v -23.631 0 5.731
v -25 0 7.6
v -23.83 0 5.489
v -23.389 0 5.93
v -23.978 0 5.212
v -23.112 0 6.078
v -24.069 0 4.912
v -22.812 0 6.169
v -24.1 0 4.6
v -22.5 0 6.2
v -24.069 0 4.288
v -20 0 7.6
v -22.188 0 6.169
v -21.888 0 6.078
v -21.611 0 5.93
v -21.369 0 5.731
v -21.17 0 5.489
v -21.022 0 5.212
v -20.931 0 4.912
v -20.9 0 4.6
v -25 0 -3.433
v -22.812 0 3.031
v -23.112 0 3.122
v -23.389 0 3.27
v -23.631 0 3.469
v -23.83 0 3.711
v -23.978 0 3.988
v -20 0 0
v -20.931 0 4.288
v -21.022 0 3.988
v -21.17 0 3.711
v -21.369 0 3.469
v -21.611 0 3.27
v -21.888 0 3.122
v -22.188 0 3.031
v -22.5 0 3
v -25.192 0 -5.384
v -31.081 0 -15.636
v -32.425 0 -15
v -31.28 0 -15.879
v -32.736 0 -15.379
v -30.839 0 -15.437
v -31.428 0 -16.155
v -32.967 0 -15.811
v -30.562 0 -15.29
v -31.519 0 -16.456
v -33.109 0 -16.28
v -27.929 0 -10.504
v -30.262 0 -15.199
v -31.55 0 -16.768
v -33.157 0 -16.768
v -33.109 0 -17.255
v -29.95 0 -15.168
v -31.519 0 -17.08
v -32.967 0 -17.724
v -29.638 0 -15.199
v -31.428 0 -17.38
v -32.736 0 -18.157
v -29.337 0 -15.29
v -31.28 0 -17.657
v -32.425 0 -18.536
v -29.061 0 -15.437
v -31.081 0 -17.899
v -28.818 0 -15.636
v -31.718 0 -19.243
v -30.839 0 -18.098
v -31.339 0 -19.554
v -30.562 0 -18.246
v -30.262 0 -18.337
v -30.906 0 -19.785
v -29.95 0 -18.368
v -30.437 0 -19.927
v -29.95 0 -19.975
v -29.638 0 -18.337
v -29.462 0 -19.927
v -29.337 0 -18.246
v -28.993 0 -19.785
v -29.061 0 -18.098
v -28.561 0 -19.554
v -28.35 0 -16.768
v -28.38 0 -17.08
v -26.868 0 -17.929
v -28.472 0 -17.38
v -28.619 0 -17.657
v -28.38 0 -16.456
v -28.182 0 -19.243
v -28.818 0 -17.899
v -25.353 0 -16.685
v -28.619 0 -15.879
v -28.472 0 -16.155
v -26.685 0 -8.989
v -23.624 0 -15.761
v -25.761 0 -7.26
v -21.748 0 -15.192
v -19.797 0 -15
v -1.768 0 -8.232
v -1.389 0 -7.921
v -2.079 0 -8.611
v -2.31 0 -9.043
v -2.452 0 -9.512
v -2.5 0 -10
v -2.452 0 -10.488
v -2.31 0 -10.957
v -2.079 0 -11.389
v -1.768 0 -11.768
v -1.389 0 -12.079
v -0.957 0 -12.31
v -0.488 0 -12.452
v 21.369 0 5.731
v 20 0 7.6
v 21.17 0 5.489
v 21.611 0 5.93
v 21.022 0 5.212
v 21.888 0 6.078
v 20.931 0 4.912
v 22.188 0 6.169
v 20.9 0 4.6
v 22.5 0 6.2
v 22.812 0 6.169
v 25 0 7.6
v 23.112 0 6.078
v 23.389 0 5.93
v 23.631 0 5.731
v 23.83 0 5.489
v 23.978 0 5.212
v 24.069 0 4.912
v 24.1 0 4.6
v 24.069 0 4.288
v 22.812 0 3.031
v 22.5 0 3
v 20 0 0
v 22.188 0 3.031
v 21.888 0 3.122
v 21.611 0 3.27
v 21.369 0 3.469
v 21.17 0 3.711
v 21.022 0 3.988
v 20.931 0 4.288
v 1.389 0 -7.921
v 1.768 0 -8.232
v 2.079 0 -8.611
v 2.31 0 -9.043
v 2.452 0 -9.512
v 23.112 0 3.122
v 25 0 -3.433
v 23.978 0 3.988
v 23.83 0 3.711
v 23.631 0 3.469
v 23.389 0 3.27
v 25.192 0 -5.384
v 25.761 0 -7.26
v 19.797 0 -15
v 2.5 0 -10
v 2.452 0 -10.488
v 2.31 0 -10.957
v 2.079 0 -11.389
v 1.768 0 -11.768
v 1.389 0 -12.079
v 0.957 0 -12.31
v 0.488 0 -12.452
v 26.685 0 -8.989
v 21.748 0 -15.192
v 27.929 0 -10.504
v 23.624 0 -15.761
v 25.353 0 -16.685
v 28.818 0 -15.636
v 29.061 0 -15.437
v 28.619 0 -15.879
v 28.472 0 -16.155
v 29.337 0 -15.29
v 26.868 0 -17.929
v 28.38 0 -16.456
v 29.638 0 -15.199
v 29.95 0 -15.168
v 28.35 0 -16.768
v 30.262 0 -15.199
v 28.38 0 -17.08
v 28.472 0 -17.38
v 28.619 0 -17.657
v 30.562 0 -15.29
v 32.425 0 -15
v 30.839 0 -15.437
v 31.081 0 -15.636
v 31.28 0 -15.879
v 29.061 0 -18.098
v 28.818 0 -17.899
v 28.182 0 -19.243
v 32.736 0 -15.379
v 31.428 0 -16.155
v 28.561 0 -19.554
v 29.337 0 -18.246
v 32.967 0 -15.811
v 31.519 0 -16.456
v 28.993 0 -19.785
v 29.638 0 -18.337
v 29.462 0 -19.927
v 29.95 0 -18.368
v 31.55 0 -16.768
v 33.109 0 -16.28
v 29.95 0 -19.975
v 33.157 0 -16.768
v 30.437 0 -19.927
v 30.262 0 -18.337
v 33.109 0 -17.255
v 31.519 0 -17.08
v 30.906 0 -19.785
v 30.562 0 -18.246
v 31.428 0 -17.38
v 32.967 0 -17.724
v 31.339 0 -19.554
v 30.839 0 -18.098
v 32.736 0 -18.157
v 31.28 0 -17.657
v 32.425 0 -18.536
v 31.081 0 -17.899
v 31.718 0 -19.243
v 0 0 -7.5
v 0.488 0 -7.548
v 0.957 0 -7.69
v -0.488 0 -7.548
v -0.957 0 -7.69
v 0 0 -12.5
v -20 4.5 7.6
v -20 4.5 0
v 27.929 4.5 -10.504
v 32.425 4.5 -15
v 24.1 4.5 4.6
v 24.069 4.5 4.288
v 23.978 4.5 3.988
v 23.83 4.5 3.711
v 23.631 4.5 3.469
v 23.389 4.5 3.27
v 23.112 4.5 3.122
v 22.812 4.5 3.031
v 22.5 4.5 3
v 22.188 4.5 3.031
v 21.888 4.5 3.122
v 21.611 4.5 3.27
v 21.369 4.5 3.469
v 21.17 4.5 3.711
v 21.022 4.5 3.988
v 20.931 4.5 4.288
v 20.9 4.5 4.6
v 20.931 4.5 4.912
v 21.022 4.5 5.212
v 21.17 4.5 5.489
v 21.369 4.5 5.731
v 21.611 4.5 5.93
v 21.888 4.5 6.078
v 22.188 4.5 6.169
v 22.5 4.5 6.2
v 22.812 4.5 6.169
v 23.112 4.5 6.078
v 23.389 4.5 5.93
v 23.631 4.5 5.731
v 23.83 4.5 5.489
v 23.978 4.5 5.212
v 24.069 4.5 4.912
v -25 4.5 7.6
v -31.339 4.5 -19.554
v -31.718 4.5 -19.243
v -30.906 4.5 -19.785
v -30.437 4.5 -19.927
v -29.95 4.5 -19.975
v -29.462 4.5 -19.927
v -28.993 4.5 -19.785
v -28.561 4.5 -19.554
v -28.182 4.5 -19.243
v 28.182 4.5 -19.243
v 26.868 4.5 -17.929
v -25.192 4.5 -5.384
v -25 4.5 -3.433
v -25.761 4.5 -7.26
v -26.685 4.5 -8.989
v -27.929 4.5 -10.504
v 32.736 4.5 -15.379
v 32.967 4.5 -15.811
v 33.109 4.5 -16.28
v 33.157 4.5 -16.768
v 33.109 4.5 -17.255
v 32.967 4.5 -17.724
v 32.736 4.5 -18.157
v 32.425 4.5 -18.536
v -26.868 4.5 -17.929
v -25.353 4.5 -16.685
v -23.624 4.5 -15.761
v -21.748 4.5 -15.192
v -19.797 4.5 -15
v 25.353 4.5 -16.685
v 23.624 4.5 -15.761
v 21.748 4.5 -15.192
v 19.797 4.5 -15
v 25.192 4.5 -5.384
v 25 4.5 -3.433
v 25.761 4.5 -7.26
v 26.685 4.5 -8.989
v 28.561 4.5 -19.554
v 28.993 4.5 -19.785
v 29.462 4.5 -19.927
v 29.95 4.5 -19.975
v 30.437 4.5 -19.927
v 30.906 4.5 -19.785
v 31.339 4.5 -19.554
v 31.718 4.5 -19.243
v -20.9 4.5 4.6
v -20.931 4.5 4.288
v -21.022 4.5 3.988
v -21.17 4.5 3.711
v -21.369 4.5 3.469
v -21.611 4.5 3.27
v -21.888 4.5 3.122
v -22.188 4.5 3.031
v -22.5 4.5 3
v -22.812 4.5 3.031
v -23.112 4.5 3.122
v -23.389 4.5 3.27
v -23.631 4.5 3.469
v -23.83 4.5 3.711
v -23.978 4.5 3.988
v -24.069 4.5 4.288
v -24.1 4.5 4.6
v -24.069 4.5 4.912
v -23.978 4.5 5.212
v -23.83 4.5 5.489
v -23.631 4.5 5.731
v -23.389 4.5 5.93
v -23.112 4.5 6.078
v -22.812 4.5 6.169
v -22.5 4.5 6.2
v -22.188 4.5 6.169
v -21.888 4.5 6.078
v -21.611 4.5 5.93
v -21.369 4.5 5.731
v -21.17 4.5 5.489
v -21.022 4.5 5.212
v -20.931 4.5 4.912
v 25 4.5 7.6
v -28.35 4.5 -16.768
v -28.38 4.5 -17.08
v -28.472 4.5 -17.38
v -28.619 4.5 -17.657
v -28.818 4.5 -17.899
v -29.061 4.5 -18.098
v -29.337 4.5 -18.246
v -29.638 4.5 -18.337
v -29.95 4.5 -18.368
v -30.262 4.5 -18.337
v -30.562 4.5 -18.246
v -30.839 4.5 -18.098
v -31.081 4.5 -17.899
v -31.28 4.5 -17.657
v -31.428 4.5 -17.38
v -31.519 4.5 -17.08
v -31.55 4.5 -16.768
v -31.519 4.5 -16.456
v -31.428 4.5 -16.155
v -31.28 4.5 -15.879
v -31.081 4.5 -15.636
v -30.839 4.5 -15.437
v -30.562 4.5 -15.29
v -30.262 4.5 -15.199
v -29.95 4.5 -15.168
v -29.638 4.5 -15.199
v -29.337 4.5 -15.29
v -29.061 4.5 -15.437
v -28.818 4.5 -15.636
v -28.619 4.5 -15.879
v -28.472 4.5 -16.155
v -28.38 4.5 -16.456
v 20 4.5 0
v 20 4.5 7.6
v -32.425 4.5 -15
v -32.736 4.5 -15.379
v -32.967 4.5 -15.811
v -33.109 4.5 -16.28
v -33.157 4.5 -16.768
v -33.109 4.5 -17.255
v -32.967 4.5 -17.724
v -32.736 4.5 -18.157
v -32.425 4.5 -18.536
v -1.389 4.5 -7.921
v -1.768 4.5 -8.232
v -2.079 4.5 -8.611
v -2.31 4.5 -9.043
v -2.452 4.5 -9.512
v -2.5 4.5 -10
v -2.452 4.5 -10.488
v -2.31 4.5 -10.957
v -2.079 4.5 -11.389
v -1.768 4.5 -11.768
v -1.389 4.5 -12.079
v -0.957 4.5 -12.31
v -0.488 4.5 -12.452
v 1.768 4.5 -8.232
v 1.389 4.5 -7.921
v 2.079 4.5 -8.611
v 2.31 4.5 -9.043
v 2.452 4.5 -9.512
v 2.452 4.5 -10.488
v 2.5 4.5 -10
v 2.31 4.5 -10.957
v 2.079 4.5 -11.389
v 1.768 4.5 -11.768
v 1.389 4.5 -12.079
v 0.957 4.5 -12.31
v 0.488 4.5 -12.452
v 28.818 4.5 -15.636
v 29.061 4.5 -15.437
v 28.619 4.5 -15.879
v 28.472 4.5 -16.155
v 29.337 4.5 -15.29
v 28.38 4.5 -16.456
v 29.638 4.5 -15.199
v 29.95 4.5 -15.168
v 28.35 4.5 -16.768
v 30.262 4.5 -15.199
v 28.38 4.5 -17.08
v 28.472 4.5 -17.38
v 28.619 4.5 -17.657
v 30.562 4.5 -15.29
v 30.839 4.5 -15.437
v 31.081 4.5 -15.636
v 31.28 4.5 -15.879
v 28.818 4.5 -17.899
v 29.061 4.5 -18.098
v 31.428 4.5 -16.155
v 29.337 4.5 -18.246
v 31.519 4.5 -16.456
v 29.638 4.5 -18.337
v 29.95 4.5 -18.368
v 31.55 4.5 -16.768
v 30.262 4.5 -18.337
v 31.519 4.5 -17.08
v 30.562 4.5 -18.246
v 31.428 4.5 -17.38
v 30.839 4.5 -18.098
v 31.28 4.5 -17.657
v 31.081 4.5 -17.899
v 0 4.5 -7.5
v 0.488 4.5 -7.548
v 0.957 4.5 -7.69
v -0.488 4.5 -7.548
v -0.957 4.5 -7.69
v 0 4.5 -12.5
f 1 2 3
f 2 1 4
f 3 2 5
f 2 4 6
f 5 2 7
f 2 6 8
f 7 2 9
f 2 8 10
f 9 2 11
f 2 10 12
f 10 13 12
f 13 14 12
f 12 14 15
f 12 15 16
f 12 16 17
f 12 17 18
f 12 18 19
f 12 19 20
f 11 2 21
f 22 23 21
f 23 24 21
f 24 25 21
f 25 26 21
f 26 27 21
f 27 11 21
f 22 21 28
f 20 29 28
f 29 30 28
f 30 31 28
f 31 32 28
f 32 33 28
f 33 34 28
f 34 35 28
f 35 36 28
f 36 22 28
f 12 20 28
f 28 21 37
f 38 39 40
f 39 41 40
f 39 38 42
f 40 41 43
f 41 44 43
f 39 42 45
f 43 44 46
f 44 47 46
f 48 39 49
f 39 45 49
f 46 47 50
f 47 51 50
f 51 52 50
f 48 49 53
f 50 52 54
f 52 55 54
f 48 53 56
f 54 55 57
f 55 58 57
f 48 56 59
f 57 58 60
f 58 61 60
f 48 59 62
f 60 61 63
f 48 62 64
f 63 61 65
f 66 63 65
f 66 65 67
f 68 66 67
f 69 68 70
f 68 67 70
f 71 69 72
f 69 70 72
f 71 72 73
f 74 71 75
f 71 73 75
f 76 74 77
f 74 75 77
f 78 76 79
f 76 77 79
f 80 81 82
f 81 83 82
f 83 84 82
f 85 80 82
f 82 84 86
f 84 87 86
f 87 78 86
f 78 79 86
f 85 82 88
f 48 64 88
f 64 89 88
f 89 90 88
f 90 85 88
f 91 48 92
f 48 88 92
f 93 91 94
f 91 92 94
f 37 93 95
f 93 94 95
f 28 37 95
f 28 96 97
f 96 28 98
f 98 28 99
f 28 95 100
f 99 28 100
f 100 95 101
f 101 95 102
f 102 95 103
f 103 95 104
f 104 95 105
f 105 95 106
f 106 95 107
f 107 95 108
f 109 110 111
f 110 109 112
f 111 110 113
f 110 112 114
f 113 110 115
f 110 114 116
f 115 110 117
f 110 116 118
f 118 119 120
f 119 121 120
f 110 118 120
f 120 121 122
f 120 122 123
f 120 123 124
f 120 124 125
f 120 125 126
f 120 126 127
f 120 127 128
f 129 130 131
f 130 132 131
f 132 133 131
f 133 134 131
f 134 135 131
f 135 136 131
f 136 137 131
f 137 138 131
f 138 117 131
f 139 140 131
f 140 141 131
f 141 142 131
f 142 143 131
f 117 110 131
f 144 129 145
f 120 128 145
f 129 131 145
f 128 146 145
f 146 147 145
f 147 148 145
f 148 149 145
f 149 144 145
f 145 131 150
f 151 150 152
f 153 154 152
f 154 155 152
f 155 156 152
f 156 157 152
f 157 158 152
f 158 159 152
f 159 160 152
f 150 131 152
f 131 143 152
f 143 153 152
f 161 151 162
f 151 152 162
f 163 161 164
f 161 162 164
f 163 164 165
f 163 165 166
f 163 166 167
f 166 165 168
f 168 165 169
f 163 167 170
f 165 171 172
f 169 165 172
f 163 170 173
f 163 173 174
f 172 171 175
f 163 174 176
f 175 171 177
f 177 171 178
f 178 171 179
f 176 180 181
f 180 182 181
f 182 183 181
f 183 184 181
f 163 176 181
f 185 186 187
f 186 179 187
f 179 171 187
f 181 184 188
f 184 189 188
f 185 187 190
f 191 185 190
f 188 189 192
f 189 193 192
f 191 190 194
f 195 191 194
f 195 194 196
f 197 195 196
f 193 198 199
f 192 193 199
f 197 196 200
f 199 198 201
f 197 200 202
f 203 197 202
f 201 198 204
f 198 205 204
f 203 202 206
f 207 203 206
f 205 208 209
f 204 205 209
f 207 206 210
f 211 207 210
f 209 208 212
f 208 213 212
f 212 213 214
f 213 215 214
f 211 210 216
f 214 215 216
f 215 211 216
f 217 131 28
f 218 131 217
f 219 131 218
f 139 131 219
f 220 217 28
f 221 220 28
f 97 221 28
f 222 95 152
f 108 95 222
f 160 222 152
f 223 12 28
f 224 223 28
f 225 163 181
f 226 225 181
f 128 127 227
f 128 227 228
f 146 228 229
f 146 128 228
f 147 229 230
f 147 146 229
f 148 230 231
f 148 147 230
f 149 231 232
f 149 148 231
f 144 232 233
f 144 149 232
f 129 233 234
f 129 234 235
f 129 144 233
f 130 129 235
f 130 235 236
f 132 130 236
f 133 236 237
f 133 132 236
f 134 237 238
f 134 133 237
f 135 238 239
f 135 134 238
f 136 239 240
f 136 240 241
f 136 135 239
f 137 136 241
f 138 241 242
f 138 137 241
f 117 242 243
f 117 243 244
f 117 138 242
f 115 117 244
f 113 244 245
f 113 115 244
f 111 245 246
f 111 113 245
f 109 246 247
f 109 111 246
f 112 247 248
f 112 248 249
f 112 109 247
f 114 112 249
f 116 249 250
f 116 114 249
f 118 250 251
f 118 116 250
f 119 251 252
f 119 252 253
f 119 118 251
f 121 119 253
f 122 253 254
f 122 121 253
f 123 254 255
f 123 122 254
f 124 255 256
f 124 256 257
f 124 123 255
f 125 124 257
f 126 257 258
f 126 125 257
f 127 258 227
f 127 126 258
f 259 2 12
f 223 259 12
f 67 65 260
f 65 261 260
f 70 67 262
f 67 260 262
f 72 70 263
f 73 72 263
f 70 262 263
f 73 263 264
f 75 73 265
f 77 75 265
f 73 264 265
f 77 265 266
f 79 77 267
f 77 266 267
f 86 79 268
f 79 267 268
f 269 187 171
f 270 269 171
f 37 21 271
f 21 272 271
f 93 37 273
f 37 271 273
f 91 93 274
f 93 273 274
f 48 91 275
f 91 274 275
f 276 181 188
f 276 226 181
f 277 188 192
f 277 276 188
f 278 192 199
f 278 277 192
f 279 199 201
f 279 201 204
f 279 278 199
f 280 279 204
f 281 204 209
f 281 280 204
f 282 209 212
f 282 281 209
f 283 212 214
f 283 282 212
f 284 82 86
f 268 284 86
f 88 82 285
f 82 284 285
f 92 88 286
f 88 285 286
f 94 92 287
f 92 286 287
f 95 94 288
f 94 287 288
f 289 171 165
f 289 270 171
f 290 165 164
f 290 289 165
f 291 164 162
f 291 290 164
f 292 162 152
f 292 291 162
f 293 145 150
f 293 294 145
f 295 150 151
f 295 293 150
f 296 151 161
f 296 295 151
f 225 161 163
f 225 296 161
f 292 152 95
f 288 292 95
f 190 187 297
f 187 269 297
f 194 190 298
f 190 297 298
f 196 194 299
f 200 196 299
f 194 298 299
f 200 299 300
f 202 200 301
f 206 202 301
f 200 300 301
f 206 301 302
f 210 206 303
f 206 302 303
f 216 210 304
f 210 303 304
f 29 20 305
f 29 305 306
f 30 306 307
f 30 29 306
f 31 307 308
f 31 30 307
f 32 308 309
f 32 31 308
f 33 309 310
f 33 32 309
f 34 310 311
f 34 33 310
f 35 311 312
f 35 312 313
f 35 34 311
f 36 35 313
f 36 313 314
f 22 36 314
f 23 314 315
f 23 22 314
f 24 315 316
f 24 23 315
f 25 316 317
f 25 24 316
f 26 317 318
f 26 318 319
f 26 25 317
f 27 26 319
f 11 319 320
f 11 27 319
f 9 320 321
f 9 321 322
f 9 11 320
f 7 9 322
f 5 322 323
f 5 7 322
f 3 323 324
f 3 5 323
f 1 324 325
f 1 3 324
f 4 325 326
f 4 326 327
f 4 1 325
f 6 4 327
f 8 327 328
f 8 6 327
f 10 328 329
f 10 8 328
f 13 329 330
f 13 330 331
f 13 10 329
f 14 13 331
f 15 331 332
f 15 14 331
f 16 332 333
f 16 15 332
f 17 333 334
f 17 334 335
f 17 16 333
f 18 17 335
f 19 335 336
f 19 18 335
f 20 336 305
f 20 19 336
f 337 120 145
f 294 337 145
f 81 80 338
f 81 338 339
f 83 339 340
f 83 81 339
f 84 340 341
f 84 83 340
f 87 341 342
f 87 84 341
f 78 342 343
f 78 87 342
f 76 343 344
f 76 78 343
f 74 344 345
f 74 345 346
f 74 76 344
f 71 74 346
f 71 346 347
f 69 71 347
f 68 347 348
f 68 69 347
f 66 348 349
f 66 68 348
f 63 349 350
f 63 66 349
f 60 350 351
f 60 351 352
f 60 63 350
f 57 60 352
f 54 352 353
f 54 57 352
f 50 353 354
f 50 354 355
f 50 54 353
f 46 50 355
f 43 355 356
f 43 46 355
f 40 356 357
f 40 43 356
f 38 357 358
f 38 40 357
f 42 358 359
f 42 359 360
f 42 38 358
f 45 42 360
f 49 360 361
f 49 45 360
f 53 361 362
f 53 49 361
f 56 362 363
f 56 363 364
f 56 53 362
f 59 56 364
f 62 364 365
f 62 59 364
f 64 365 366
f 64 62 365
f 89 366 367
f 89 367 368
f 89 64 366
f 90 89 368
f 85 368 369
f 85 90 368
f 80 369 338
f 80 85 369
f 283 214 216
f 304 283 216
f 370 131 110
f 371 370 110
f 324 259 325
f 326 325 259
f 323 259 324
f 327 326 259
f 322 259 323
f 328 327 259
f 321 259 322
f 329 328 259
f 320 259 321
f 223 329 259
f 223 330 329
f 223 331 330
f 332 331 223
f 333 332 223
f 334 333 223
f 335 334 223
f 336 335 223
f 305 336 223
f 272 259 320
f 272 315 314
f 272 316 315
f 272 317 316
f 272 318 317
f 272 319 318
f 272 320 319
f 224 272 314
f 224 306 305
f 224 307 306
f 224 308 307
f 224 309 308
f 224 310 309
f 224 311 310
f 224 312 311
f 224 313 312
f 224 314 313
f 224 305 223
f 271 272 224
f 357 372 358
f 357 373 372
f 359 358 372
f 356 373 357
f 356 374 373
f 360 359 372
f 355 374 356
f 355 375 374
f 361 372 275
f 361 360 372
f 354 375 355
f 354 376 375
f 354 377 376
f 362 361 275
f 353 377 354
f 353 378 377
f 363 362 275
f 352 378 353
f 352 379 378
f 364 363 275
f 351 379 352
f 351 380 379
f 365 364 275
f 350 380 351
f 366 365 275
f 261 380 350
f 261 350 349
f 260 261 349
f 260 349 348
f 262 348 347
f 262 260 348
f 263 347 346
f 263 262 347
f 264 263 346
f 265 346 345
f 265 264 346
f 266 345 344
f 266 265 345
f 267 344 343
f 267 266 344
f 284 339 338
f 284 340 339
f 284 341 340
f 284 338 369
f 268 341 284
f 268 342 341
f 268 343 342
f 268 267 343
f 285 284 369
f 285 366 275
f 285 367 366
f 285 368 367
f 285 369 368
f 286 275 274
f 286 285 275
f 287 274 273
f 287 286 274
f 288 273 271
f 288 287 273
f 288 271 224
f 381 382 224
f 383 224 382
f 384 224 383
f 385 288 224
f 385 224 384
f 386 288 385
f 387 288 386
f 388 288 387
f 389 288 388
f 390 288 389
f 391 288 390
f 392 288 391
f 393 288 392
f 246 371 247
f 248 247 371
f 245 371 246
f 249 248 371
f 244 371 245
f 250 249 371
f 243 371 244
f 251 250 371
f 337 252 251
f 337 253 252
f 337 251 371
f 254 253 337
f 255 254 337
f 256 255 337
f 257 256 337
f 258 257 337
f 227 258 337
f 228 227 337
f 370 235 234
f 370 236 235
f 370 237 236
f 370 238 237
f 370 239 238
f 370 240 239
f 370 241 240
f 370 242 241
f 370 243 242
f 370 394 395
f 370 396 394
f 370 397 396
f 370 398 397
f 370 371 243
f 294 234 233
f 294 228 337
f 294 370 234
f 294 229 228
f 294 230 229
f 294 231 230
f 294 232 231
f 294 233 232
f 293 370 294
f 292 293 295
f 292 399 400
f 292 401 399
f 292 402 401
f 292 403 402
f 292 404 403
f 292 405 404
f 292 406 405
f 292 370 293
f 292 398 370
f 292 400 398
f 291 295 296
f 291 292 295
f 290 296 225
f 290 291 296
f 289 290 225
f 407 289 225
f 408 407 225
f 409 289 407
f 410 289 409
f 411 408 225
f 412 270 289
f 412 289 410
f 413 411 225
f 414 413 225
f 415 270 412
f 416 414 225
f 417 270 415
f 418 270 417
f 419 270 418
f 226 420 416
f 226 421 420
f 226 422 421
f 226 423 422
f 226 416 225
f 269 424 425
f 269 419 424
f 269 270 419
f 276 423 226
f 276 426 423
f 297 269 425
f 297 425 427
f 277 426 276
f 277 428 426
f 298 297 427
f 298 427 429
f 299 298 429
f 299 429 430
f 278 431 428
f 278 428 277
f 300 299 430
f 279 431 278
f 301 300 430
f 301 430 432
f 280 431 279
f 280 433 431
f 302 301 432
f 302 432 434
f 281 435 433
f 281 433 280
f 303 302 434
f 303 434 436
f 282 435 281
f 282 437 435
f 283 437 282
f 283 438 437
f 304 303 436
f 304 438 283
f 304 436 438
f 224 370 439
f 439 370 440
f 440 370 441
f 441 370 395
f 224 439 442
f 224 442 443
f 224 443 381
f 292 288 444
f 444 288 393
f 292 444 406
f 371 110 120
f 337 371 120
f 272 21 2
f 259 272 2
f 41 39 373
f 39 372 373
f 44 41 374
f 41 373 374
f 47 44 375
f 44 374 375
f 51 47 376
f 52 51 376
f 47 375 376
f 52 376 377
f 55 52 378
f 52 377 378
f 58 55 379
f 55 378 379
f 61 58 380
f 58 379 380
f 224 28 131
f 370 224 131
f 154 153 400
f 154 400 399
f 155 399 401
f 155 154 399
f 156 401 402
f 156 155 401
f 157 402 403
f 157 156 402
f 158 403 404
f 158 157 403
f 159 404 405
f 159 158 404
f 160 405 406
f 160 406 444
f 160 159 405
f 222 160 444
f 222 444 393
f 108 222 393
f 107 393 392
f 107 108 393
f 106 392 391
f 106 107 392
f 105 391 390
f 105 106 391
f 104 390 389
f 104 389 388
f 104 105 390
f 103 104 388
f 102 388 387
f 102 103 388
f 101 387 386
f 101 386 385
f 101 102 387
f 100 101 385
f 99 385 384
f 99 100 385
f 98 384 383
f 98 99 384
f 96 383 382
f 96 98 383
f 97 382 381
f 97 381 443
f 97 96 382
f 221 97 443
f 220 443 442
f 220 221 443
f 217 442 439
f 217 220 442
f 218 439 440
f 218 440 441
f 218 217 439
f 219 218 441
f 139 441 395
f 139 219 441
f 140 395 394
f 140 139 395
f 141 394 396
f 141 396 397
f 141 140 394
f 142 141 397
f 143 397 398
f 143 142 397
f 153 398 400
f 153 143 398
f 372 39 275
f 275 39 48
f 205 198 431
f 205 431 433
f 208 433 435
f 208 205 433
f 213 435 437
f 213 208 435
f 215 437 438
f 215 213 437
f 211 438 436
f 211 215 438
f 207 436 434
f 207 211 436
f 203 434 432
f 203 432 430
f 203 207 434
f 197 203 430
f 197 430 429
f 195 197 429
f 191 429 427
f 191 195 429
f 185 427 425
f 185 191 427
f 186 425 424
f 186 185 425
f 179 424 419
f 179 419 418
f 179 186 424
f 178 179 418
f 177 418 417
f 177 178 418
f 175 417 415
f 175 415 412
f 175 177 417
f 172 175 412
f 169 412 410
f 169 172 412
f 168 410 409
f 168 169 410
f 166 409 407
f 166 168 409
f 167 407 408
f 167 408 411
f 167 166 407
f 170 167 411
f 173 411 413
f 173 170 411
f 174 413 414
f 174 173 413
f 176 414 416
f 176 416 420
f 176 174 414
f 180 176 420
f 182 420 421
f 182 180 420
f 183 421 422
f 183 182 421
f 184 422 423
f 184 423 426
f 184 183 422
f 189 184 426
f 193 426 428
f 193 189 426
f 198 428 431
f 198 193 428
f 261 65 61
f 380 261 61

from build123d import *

# Parameters (mm, degrees)
SKETCH1_R           = 1.6
SKETCH1_R_2         = 2.5
BOSS_EXTRUDE1_DEPTH = 4.5
FILLET1_R           = 10
FILLET2_R           = 2.5


with BuildPart() as part:
    # Sketch1 → Boss-Extrude1 (new body)
    with BuildSketch(Plane(origin=(0, 0, 0), x_dir=(1, 0, 0), z_dir=(0, 1, 0))):
        Polygon((-20, 0), (20, 0), (20, -7.6), (25, -7.6), (25, 7.575378798), (34.192388155, 16.767766953), (29.949747468, 21.01040764), (23.939339828, 15), (-23.939339828, 15), (-29.949747468, 21.01040764), (-34.192388155, 16.767766953), (-25, 7.575378798), (-25, -7.6), (-20, -7.6), align=None)
        with Locations((-22.5, -4.6)):
            Circle(SKETCH1_R, mode=Mode.SUBTRACT)
        with Locations((22.5, -4.6)):
            Circle(SKETCH1_R, mode=Mode.SUBTRACT)
        with Locations((-29.949747468, 16.767766953)):
            Circle(SKETCH1_R, mode=Mode.SUBTRACT)
        with Locations((29.949747468, 16.767766953)):
            Circle(SKETCH1_R, mode=Mode.SUBTRACT)
        with Locations((0, 10)):
            Circle(SKETCH1_R_2, mode=Mode.SUBTRACT)
    extrude(amount=BOSS_EXTRUDE1_DEPTH)

    # Fillet1
    fillet1_edges = [part.edges().sort_by_distance(p)[0] for p in [
        (-25, 2.25, -7.575378798),
        (-23.939339828, 2.25, -15),
        (23.939339828, 2.25, -15),
        (25, 2.25, -7.575378798),
    ]]
    fillet(fillet1_edges, radius=FILLET1_R)

    # Fillet2
    fillet2_edges = [part.edges().sort_by_distance(p)[0] for p in [
        (-34.192388155, 2.25, -16.767766953),
        (-29.949747468, 2.25, -21.01040764),
        (29.949747468, 2.25, -21.01040764),
        (34.192388155, 2.25, -16.767766953),
    ]]
    fillet(fillet2_edges, radius=FILLET2_R)


solid = part.part
